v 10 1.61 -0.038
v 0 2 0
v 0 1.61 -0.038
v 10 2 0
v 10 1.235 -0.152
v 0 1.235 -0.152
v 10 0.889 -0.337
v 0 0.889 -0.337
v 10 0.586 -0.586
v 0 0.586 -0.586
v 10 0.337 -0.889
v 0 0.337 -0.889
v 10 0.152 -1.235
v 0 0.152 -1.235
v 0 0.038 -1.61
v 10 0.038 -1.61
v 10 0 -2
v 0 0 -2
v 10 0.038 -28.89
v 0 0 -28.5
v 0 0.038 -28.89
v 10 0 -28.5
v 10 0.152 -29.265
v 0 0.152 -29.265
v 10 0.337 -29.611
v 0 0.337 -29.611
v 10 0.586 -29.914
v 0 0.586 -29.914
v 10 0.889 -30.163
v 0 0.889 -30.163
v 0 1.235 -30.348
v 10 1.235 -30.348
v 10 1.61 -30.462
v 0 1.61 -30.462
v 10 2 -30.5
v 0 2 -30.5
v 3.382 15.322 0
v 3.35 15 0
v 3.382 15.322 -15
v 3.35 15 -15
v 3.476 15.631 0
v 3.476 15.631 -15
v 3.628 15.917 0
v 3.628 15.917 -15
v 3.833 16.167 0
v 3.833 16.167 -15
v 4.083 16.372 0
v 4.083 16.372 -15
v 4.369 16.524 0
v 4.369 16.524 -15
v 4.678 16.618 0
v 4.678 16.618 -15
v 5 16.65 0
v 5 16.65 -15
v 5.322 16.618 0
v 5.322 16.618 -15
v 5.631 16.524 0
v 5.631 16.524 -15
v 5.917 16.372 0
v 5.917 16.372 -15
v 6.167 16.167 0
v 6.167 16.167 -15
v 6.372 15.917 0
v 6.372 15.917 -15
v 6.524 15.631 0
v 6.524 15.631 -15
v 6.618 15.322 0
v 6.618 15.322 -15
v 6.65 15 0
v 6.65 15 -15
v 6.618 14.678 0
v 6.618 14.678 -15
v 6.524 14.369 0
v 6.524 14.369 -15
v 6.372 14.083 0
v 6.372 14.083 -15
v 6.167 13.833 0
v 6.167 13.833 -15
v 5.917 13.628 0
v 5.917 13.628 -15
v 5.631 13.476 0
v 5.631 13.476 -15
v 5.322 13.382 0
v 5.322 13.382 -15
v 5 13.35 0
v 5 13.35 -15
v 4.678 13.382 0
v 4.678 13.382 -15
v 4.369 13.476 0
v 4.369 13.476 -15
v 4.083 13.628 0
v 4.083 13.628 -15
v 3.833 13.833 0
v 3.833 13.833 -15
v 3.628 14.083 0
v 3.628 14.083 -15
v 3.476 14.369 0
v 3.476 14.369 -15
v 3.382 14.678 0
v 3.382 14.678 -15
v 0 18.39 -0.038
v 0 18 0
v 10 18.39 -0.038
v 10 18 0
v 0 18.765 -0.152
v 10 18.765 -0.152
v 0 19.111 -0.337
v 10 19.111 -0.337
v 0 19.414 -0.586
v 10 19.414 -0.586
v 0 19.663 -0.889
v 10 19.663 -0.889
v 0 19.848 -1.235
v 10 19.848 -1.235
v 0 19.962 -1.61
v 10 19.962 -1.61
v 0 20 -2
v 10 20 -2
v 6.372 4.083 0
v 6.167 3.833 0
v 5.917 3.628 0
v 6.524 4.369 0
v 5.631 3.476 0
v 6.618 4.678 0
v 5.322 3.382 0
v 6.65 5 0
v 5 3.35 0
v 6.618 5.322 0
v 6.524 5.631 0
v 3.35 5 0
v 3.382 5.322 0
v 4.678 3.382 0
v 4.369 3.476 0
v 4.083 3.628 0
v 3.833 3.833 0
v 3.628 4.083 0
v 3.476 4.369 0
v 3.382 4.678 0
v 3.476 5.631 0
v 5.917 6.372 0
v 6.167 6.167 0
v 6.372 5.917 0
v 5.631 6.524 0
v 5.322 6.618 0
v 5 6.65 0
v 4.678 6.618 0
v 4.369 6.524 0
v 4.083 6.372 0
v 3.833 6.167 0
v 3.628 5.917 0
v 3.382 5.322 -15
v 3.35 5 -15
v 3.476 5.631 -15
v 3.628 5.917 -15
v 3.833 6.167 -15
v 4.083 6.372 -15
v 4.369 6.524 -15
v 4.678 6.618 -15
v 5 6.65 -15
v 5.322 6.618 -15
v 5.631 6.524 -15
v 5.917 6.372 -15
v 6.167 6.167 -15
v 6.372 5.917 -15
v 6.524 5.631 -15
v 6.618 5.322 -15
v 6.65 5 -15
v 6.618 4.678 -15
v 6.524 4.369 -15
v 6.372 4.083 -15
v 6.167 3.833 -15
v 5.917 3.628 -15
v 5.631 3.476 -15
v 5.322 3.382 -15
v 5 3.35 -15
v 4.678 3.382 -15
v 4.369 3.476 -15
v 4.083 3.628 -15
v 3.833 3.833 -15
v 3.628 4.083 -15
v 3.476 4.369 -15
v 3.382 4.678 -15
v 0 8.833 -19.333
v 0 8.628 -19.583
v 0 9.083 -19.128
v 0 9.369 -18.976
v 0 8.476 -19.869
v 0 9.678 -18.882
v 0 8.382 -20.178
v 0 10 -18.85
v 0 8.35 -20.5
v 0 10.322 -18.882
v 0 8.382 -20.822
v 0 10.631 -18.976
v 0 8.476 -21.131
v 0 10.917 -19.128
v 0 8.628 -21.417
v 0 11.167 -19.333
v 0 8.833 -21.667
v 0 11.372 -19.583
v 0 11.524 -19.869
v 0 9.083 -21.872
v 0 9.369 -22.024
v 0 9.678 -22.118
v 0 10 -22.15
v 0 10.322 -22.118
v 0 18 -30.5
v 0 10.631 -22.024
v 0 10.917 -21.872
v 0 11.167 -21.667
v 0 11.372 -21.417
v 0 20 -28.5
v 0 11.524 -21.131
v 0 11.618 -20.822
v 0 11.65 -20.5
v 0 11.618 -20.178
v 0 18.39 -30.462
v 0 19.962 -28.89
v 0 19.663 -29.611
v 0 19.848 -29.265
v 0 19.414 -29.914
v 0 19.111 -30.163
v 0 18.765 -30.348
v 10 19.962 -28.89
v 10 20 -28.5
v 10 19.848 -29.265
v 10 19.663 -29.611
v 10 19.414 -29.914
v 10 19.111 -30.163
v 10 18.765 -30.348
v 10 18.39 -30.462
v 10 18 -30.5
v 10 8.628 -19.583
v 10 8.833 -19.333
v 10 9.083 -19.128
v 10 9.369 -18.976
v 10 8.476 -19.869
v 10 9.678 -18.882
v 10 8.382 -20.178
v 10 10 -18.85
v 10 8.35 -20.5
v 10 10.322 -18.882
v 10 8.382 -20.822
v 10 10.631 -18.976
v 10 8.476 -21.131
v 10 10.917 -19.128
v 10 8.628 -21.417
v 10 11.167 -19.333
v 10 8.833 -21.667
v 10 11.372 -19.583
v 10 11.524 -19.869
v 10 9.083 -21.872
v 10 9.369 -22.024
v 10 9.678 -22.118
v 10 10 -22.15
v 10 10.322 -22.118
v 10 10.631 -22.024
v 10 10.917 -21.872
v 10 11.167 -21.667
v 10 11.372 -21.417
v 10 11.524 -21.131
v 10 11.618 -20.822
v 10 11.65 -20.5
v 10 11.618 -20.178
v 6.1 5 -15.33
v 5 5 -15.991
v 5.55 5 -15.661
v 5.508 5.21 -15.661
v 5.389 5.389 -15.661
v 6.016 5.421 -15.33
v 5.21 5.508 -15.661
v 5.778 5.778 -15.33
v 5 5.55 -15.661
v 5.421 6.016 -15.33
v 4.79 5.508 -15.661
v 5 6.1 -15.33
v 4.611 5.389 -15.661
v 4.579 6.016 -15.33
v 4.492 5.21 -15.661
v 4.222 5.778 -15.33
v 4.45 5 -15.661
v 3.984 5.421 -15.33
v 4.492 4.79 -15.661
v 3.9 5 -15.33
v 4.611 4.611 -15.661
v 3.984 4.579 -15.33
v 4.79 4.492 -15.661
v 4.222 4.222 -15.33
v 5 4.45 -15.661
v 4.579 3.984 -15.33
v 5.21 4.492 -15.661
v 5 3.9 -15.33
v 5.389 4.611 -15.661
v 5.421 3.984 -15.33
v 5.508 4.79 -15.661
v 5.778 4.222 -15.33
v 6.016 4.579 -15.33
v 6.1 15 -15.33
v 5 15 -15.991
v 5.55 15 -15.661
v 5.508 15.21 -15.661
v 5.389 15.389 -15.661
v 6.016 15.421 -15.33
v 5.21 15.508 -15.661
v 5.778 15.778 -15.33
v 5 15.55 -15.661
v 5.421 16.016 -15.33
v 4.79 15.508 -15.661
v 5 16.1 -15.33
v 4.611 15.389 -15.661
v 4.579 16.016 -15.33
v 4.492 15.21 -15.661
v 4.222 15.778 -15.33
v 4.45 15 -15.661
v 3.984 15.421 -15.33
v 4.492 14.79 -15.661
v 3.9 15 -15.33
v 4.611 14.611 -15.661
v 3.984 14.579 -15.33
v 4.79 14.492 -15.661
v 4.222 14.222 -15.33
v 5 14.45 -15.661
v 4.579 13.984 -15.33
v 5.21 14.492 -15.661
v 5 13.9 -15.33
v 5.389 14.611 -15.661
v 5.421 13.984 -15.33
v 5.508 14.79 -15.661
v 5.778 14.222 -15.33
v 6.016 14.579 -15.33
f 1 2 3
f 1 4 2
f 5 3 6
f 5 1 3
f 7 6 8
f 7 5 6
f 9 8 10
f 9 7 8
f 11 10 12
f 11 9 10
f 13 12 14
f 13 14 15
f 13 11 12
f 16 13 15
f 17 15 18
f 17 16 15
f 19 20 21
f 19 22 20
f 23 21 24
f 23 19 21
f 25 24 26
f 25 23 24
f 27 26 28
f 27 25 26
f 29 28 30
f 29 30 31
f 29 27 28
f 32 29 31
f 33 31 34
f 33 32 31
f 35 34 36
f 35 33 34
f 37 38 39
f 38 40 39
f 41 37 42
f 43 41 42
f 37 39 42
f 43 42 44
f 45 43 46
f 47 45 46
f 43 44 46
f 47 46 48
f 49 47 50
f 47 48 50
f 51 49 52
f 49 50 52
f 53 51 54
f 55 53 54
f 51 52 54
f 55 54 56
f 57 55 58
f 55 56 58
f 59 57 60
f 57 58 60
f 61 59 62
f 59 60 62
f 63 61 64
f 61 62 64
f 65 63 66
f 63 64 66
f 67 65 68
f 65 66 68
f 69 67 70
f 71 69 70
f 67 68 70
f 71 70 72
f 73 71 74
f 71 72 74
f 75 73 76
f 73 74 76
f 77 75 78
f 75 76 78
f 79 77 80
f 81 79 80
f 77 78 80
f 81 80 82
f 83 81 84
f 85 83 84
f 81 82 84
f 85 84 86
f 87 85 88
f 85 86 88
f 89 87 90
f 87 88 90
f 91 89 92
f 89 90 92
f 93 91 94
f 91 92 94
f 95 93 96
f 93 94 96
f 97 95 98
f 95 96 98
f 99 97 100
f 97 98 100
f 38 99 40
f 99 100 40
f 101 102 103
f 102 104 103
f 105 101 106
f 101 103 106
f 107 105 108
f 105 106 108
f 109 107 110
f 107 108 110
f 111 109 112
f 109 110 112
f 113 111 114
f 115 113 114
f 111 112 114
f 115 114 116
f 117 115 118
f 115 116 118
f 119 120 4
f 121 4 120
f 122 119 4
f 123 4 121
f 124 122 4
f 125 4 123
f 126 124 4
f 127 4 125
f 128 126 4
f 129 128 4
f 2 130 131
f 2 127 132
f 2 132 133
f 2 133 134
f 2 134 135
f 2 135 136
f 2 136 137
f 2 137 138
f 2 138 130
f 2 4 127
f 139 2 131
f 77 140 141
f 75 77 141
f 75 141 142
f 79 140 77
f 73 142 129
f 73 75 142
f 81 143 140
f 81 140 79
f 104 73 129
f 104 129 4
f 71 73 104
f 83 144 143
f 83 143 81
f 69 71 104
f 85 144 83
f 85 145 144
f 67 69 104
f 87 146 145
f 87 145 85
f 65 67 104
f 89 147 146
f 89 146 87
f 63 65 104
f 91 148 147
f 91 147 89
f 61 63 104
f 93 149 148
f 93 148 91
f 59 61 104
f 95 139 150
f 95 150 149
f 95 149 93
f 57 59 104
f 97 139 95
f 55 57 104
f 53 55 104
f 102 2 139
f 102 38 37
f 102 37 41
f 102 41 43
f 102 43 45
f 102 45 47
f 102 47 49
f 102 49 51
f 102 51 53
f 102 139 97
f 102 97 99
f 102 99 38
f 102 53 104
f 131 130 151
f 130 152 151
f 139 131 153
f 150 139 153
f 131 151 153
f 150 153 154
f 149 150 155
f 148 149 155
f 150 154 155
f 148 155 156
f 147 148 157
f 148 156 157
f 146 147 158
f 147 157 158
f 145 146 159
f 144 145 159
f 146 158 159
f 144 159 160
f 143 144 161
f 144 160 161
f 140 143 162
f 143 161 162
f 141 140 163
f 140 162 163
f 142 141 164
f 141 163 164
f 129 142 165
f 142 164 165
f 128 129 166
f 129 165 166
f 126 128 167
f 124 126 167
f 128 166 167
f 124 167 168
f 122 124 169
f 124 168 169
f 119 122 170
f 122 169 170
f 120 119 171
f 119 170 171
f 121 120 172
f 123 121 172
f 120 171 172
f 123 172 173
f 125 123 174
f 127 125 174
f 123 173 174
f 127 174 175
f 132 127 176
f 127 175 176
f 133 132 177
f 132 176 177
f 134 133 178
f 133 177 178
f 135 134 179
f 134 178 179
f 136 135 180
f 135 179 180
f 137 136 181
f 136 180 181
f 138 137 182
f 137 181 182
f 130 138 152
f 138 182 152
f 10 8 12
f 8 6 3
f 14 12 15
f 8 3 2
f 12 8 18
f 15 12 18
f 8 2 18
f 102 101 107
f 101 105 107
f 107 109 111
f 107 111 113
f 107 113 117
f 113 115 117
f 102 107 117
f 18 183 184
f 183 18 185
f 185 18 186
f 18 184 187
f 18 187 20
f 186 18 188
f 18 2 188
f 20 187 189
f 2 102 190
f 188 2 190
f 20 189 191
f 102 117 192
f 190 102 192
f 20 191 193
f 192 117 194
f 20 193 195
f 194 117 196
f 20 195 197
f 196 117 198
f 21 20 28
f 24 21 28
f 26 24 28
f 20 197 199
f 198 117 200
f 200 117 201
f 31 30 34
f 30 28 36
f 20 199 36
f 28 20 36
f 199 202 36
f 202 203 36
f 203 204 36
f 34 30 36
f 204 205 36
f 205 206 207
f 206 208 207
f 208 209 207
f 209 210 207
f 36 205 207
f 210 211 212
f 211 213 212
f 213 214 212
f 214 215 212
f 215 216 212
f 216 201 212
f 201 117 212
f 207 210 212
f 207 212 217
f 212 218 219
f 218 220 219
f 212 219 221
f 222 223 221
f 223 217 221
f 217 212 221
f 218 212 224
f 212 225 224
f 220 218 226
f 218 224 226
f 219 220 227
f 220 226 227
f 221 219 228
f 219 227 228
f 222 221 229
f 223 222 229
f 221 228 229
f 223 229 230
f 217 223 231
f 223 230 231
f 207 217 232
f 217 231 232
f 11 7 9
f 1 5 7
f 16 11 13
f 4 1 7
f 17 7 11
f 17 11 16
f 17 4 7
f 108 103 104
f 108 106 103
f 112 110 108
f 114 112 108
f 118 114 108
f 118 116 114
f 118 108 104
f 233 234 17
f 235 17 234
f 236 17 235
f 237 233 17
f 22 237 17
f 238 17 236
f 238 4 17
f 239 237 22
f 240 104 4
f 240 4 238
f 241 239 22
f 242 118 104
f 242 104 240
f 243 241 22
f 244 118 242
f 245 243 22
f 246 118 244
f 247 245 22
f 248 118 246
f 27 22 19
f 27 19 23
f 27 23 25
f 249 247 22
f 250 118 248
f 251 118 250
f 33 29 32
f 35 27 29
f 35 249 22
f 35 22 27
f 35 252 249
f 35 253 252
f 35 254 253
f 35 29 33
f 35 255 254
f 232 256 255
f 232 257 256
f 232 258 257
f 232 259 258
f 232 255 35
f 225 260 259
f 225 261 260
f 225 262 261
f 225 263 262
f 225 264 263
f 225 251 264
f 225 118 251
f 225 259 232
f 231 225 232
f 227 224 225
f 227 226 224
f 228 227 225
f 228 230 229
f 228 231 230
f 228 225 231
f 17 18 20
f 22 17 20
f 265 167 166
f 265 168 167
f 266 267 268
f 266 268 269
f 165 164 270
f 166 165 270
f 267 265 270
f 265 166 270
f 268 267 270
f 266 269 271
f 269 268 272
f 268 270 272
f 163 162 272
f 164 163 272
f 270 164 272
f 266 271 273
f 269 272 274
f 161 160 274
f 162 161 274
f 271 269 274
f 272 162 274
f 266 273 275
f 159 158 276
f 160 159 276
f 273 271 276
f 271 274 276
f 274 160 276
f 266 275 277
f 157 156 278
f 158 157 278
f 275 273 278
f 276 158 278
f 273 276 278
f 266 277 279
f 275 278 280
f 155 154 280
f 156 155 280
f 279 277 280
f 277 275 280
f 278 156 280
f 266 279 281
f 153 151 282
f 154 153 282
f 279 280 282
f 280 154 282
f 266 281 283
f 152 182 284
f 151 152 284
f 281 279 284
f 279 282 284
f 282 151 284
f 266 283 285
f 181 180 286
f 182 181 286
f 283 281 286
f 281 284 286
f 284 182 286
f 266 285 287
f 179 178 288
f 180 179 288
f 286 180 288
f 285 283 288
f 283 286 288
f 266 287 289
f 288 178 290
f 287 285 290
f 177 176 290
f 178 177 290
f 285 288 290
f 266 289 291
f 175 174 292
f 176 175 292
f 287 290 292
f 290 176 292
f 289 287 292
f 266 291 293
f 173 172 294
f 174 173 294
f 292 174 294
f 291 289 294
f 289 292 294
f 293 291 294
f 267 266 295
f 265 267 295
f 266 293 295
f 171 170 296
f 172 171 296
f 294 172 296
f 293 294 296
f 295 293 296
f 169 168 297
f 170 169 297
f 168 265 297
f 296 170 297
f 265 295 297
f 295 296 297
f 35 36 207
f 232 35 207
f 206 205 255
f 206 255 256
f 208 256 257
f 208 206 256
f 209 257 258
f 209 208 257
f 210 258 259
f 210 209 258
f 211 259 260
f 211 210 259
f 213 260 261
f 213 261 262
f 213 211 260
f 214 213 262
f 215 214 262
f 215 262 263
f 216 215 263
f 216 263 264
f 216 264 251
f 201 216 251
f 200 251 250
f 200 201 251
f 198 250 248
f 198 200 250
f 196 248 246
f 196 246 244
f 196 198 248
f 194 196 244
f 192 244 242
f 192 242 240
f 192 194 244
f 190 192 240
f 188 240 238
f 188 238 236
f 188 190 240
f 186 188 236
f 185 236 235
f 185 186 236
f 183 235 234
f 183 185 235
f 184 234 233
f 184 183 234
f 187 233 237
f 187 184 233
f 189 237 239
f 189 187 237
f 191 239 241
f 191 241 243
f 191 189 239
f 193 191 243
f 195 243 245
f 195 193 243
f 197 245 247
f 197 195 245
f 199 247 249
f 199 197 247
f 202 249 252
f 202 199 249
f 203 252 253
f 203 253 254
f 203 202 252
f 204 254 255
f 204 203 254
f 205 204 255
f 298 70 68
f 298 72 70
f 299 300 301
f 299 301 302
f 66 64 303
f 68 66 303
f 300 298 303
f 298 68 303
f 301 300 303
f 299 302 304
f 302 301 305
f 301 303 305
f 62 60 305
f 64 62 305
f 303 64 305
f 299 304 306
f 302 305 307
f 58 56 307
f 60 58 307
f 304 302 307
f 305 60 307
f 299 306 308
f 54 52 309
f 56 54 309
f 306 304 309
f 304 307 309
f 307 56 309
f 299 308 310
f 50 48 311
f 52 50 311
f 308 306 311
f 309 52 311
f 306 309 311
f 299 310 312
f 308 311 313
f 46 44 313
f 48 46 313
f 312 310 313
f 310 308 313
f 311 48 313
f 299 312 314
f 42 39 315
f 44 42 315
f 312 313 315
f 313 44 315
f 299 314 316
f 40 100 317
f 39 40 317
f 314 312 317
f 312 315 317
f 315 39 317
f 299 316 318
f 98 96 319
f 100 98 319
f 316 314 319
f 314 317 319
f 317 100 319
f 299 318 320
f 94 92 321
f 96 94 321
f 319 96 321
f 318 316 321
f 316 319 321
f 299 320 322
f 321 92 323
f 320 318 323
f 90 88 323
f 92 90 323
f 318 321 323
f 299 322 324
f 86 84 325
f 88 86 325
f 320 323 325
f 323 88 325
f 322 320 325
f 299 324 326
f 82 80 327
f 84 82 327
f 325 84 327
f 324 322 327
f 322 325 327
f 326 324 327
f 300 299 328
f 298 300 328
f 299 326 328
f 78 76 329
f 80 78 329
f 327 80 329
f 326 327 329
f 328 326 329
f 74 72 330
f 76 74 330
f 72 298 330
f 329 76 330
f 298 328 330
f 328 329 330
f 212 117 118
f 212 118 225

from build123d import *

# Parameters (mm, degrees)
SKETCH_1_W      = 30.5
SKETCH_1_H      = 20
SKETCH_1_R      = 1.65
EXTRUDE_1_DEPTH = 10
M4X0_7_1_D      = 3.3
M4X0_7_1_DEPTH  = 15
M4X0_7_1_TIP    = 0.991420021
FILLET_1_R      = 2


with BuildPart() as part:
    # ｽｹｯﾁ1 → ﾎﾞｽ - 押し出し1 (new body)
    with BuildSketch(Plane(origin=(0, 0, 0), x_dir=(0, 0, -1), z_dir=(1, 0, 0))):
        with Locations((15.25, 10)):
            Rectangle(SKETCH_1_W, SKETCH_1_H)
        with Locations((20.5, 10)):
            Circle(SKETCH_1_R, mode=Mode.SUBTRACT)
    extrude(amount=EXTRUDE_1_DEPTH)

    # M4x0.7 ねじ穴1
    with Locations(Plane.XY):
        with Locations((5, 5), (5, 15)):
            Hole(M4X0_7_1_D / 2, depth=M4X0_7_1_DEPTH)
            with Locations((0, 0, -(M4X0_7_1_DEPTH + M4X0_7_1_TIP / 2))):  # 118° drill point
                Cone(0, M4X0_7_1_D / 2, M4X0_7_1_TIP, mode=Mode.SUBTRACT)

    # ﾌｨﾚｯﾄ1
    fillet_1_edges = [part.edges().sort_by_distance(p)[0] for p in [
        (5, 20, 0),
        (5, 20, -30.5),
        (5, 0, -30.5),
        (5, 0, 0),
    ]]
    fillet(fillet_1_edges, radius=FILLET_1_R)


solid = part.part
